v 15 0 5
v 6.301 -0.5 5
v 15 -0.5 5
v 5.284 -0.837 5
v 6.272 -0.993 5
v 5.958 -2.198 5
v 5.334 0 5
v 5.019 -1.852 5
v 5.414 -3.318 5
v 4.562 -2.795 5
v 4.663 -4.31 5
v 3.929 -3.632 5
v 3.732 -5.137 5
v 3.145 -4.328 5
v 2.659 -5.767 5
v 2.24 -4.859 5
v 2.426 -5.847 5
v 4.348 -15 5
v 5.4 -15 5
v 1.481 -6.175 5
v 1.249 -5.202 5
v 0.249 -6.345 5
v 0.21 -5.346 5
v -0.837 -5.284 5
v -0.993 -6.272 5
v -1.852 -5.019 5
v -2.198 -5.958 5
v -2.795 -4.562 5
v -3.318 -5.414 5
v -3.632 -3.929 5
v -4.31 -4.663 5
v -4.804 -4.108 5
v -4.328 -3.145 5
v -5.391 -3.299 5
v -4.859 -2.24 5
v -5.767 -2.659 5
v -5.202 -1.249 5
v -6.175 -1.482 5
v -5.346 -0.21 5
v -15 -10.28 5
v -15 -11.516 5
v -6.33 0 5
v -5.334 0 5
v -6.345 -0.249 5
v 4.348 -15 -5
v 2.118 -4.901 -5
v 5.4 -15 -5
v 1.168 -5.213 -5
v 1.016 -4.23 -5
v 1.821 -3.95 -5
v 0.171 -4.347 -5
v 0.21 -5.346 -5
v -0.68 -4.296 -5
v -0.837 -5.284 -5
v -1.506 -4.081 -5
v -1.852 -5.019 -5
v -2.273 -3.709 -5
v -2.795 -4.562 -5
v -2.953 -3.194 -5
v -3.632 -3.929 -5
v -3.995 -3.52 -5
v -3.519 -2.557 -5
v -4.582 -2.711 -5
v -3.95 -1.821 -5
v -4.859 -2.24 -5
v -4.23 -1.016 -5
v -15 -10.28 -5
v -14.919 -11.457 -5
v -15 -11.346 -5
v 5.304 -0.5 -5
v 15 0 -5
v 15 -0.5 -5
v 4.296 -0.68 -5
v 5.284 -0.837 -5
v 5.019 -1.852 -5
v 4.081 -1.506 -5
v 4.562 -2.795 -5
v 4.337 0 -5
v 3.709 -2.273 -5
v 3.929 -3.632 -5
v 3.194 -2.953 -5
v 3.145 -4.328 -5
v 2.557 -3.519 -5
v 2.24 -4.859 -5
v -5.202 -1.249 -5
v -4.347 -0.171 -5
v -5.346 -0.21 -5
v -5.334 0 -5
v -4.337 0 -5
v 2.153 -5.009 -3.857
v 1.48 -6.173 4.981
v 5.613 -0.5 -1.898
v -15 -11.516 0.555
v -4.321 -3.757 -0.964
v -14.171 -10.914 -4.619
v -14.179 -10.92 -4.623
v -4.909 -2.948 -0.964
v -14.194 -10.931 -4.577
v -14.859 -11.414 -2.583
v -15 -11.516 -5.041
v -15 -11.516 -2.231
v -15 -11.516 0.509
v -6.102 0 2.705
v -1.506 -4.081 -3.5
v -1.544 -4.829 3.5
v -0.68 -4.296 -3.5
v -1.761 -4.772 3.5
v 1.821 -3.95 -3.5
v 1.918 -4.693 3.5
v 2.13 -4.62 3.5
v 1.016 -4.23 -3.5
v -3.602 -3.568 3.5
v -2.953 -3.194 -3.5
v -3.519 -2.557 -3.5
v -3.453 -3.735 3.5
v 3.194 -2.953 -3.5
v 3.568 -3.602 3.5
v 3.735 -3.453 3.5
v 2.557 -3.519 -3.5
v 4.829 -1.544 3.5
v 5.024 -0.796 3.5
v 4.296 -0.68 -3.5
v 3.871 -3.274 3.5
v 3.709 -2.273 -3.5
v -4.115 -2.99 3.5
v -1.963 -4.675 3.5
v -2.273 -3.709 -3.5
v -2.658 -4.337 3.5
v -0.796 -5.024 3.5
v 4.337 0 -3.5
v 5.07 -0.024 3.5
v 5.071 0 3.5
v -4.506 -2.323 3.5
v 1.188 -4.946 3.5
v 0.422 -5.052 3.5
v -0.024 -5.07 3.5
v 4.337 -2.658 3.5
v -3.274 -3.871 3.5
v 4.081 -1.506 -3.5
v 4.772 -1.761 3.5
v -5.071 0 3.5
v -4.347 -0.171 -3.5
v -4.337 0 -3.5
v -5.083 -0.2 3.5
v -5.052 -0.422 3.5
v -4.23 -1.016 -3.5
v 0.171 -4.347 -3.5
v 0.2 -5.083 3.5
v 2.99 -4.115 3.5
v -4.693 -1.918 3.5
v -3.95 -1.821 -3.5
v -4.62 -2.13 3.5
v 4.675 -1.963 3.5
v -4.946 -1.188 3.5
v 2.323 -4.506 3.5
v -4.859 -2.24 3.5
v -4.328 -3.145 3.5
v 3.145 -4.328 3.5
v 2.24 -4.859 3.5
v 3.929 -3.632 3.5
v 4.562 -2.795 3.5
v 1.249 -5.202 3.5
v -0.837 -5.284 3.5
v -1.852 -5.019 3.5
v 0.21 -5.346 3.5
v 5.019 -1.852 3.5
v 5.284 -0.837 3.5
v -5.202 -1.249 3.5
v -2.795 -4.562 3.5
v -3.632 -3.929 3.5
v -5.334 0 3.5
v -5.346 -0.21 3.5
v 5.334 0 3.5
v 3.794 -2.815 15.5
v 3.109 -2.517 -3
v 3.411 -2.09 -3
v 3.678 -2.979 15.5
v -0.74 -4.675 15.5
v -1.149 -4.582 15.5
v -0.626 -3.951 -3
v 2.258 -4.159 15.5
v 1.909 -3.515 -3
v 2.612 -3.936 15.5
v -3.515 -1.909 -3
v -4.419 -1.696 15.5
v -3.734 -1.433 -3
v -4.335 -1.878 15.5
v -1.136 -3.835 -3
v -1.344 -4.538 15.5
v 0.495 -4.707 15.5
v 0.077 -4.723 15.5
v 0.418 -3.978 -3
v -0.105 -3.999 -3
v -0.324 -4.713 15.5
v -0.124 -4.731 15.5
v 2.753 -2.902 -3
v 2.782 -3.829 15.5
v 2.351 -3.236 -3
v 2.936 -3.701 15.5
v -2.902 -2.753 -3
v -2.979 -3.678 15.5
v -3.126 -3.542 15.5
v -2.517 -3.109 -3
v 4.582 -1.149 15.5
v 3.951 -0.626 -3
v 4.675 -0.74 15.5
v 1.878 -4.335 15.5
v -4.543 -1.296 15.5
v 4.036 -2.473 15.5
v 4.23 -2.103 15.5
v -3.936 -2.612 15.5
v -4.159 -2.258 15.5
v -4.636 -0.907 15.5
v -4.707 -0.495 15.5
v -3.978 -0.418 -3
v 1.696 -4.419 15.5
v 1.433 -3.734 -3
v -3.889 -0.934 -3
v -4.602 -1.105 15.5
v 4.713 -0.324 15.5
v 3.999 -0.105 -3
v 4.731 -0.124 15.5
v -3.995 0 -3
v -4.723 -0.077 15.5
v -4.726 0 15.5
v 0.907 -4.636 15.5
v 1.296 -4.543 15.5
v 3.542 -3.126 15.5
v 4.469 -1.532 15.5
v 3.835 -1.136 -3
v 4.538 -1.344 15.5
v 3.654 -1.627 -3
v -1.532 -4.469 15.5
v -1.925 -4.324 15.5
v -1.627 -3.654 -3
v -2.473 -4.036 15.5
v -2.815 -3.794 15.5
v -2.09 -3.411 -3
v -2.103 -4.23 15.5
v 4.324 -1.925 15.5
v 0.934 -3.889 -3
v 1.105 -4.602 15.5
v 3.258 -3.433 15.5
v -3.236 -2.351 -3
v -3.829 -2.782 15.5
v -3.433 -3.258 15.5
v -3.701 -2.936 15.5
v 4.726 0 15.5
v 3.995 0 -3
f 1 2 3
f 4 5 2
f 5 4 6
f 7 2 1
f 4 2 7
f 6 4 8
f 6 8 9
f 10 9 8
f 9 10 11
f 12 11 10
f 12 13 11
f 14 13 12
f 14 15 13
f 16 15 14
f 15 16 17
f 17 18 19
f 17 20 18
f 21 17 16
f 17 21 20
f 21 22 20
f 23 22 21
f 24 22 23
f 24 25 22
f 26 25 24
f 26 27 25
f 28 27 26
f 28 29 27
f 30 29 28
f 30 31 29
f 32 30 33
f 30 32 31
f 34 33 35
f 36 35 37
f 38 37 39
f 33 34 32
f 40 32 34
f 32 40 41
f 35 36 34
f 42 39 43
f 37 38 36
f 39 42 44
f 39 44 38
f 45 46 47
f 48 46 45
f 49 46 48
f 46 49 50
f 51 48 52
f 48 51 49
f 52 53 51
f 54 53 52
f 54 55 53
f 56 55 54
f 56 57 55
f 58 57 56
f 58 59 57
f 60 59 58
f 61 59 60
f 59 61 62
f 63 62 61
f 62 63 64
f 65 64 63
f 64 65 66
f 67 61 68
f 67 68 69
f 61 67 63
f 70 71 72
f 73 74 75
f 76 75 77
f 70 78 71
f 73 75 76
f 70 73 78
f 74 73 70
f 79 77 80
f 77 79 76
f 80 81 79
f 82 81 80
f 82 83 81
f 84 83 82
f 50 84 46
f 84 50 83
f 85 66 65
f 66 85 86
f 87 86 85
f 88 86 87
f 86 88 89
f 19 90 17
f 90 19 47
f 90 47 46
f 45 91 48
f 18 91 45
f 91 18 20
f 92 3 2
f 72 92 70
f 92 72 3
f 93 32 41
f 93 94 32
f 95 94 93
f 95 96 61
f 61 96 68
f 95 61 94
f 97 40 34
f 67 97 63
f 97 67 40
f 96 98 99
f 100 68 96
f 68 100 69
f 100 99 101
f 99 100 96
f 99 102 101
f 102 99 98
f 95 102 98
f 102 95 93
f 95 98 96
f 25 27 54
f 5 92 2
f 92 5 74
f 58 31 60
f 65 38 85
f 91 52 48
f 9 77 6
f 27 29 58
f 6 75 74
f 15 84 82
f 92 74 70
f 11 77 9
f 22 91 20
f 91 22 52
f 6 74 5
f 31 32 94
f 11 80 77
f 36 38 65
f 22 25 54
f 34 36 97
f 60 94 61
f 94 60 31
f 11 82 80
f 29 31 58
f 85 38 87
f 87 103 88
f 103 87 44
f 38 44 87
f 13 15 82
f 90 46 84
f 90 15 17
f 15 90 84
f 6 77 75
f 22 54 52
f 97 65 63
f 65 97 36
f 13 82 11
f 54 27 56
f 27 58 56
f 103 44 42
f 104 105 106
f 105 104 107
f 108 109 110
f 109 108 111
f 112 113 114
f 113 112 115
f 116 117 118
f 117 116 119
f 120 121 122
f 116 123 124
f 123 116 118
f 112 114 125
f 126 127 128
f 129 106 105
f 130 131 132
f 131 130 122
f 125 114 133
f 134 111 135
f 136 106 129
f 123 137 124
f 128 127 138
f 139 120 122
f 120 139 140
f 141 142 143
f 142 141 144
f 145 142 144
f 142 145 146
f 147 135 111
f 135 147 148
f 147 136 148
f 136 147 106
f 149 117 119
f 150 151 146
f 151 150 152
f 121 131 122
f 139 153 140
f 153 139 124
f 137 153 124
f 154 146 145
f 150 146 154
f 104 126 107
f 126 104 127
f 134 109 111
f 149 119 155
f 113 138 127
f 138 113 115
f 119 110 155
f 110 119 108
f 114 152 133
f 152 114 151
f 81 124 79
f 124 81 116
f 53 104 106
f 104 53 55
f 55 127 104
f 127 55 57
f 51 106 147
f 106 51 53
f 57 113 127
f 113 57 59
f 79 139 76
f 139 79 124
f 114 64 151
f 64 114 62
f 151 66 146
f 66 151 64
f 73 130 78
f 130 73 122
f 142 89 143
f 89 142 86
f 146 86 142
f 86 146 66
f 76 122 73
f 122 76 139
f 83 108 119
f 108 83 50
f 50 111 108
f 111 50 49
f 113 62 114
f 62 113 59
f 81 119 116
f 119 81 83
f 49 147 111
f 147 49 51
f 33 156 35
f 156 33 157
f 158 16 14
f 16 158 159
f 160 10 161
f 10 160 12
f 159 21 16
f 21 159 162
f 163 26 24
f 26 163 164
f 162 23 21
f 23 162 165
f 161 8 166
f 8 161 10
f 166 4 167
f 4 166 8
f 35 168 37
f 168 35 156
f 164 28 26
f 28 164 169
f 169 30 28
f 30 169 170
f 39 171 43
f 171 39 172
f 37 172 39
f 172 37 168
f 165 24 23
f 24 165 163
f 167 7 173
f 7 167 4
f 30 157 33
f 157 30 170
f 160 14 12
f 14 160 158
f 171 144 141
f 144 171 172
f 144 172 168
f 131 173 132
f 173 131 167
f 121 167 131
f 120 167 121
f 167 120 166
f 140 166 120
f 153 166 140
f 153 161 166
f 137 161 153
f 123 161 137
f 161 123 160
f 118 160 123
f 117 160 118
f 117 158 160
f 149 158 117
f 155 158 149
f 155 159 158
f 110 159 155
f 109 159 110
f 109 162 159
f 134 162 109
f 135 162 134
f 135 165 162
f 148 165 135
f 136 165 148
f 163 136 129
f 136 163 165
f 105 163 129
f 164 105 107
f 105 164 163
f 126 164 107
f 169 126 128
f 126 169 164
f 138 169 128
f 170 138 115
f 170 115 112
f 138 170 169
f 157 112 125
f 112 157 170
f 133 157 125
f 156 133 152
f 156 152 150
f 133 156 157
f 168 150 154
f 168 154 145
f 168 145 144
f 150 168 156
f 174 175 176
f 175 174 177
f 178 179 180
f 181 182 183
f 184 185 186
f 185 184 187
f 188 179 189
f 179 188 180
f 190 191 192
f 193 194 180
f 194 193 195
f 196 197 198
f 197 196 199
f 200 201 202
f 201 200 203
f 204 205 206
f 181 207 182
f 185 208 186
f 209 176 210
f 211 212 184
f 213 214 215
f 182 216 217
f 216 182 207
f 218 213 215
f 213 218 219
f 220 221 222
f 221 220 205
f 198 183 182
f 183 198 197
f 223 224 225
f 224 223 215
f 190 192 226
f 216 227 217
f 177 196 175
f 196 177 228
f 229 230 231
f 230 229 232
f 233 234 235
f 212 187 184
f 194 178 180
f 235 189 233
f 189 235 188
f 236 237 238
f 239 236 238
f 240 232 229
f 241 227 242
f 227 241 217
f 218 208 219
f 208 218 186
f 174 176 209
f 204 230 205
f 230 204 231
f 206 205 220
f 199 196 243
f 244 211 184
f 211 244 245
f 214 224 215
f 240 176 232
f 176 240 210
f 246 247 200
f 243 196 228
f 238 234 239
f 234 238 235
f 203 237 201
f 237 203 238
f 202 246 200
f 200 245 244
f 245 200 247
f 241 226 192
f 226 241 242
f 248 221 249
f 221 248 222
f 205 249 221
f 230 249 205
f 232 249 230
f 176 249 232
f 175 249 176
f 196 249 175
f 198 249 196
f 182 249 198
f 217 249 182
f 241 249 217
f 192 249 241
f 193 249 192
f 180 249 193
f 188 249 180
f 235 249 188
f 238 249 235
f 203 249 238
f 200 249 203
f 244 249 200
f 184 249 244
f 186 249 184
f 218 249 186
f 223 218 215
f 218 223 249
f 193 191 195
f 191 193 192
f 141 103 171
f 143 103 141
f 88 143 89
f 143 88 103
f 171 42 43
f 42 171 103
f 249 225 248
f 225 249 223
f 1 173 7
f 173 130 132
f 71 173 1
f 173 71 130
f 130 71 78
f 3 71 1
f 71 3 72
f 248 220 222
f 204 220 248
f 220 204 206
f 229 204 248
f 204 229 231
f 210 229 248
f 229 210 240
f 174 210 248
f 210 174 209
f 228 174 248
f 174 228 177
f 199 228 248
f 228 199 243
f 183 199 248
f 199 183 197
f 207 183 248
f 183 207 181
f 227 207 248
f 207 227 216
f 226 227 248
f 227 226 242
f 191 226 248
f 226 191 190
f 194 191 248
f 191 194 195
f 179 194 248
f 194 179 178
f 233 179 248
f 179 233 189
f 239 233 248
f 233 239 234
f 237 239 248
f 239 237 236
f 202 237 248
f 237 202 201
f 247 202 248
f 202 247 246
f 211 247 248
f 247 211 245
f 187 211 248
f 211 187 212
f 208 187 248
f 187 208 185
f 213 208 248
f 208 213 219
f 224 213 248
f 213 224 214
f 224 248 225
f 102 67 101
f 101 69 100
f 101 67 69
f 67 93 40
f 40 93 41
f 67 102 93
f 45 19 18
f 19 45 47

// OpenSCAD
// Ssymmank lamp -- STEM FIT TEST.  Drops real mushroom stems into the hub and a
// corner socket of one tile, then cross-cuts to verify the bore is clear of bar
// material and the conical stem seats with clearance.
// Modules/params come from star.scad, so edits there propagate here.

include <star.scad>
SHOW_STAR = false;   // library mode: don't draw the lone star tile

// The mushroom stem is a straight cone: r=STEM_TIP_R at the tip, widening to
// THROAT_R (8) at the throat (THROAT_Z = -20 in mushroom coords). We model just
// that cone -- the part that enters the bore -- so the cross-section is small
// and the seating/clearance is exact (the full mushroom adds nothing here).
THROAT_R = 8; THROAT_Z = -20;
SEAT = -3.0;   // stem tip lands here (node-local z); bore floor is at -3.5
STUB = 30;     // how much of the stem to draw (mm)

module stem(i, sl) {
    slope = (THROAT_R - STEM_TIP_R) / (sl - THROAT_Z * -1);   // r-gain per mm
    multmatrix(STAR_NODE_M[i]) translate([0, 0, SEAT])
        color("Cornsilk")
        cylinder(h = STUB, r1 = STEM_TIP_R, r2 = STEM_TIP_R + slope * STUB, $fn = 48);
}

module scene() difference() {
    union() {
        color("#9FB6CF") star();
        stem(0, 120.96);   // hub (XL)
        stem(1, 70.0);     // one corner (small)
    }
    translate([-500, 0, -500]) cube([1000, 1000, 1000]);   // cut at y=0
}

VIEW = "socket";   // "socket" -> zoom the hub bore cross-section; "full" -> whole
if (VIEW == "socket")
    intersection() { scene(); translate([0, -7, 2.5]) cube([30, 16, 26], center = true); }
else
    scene();
